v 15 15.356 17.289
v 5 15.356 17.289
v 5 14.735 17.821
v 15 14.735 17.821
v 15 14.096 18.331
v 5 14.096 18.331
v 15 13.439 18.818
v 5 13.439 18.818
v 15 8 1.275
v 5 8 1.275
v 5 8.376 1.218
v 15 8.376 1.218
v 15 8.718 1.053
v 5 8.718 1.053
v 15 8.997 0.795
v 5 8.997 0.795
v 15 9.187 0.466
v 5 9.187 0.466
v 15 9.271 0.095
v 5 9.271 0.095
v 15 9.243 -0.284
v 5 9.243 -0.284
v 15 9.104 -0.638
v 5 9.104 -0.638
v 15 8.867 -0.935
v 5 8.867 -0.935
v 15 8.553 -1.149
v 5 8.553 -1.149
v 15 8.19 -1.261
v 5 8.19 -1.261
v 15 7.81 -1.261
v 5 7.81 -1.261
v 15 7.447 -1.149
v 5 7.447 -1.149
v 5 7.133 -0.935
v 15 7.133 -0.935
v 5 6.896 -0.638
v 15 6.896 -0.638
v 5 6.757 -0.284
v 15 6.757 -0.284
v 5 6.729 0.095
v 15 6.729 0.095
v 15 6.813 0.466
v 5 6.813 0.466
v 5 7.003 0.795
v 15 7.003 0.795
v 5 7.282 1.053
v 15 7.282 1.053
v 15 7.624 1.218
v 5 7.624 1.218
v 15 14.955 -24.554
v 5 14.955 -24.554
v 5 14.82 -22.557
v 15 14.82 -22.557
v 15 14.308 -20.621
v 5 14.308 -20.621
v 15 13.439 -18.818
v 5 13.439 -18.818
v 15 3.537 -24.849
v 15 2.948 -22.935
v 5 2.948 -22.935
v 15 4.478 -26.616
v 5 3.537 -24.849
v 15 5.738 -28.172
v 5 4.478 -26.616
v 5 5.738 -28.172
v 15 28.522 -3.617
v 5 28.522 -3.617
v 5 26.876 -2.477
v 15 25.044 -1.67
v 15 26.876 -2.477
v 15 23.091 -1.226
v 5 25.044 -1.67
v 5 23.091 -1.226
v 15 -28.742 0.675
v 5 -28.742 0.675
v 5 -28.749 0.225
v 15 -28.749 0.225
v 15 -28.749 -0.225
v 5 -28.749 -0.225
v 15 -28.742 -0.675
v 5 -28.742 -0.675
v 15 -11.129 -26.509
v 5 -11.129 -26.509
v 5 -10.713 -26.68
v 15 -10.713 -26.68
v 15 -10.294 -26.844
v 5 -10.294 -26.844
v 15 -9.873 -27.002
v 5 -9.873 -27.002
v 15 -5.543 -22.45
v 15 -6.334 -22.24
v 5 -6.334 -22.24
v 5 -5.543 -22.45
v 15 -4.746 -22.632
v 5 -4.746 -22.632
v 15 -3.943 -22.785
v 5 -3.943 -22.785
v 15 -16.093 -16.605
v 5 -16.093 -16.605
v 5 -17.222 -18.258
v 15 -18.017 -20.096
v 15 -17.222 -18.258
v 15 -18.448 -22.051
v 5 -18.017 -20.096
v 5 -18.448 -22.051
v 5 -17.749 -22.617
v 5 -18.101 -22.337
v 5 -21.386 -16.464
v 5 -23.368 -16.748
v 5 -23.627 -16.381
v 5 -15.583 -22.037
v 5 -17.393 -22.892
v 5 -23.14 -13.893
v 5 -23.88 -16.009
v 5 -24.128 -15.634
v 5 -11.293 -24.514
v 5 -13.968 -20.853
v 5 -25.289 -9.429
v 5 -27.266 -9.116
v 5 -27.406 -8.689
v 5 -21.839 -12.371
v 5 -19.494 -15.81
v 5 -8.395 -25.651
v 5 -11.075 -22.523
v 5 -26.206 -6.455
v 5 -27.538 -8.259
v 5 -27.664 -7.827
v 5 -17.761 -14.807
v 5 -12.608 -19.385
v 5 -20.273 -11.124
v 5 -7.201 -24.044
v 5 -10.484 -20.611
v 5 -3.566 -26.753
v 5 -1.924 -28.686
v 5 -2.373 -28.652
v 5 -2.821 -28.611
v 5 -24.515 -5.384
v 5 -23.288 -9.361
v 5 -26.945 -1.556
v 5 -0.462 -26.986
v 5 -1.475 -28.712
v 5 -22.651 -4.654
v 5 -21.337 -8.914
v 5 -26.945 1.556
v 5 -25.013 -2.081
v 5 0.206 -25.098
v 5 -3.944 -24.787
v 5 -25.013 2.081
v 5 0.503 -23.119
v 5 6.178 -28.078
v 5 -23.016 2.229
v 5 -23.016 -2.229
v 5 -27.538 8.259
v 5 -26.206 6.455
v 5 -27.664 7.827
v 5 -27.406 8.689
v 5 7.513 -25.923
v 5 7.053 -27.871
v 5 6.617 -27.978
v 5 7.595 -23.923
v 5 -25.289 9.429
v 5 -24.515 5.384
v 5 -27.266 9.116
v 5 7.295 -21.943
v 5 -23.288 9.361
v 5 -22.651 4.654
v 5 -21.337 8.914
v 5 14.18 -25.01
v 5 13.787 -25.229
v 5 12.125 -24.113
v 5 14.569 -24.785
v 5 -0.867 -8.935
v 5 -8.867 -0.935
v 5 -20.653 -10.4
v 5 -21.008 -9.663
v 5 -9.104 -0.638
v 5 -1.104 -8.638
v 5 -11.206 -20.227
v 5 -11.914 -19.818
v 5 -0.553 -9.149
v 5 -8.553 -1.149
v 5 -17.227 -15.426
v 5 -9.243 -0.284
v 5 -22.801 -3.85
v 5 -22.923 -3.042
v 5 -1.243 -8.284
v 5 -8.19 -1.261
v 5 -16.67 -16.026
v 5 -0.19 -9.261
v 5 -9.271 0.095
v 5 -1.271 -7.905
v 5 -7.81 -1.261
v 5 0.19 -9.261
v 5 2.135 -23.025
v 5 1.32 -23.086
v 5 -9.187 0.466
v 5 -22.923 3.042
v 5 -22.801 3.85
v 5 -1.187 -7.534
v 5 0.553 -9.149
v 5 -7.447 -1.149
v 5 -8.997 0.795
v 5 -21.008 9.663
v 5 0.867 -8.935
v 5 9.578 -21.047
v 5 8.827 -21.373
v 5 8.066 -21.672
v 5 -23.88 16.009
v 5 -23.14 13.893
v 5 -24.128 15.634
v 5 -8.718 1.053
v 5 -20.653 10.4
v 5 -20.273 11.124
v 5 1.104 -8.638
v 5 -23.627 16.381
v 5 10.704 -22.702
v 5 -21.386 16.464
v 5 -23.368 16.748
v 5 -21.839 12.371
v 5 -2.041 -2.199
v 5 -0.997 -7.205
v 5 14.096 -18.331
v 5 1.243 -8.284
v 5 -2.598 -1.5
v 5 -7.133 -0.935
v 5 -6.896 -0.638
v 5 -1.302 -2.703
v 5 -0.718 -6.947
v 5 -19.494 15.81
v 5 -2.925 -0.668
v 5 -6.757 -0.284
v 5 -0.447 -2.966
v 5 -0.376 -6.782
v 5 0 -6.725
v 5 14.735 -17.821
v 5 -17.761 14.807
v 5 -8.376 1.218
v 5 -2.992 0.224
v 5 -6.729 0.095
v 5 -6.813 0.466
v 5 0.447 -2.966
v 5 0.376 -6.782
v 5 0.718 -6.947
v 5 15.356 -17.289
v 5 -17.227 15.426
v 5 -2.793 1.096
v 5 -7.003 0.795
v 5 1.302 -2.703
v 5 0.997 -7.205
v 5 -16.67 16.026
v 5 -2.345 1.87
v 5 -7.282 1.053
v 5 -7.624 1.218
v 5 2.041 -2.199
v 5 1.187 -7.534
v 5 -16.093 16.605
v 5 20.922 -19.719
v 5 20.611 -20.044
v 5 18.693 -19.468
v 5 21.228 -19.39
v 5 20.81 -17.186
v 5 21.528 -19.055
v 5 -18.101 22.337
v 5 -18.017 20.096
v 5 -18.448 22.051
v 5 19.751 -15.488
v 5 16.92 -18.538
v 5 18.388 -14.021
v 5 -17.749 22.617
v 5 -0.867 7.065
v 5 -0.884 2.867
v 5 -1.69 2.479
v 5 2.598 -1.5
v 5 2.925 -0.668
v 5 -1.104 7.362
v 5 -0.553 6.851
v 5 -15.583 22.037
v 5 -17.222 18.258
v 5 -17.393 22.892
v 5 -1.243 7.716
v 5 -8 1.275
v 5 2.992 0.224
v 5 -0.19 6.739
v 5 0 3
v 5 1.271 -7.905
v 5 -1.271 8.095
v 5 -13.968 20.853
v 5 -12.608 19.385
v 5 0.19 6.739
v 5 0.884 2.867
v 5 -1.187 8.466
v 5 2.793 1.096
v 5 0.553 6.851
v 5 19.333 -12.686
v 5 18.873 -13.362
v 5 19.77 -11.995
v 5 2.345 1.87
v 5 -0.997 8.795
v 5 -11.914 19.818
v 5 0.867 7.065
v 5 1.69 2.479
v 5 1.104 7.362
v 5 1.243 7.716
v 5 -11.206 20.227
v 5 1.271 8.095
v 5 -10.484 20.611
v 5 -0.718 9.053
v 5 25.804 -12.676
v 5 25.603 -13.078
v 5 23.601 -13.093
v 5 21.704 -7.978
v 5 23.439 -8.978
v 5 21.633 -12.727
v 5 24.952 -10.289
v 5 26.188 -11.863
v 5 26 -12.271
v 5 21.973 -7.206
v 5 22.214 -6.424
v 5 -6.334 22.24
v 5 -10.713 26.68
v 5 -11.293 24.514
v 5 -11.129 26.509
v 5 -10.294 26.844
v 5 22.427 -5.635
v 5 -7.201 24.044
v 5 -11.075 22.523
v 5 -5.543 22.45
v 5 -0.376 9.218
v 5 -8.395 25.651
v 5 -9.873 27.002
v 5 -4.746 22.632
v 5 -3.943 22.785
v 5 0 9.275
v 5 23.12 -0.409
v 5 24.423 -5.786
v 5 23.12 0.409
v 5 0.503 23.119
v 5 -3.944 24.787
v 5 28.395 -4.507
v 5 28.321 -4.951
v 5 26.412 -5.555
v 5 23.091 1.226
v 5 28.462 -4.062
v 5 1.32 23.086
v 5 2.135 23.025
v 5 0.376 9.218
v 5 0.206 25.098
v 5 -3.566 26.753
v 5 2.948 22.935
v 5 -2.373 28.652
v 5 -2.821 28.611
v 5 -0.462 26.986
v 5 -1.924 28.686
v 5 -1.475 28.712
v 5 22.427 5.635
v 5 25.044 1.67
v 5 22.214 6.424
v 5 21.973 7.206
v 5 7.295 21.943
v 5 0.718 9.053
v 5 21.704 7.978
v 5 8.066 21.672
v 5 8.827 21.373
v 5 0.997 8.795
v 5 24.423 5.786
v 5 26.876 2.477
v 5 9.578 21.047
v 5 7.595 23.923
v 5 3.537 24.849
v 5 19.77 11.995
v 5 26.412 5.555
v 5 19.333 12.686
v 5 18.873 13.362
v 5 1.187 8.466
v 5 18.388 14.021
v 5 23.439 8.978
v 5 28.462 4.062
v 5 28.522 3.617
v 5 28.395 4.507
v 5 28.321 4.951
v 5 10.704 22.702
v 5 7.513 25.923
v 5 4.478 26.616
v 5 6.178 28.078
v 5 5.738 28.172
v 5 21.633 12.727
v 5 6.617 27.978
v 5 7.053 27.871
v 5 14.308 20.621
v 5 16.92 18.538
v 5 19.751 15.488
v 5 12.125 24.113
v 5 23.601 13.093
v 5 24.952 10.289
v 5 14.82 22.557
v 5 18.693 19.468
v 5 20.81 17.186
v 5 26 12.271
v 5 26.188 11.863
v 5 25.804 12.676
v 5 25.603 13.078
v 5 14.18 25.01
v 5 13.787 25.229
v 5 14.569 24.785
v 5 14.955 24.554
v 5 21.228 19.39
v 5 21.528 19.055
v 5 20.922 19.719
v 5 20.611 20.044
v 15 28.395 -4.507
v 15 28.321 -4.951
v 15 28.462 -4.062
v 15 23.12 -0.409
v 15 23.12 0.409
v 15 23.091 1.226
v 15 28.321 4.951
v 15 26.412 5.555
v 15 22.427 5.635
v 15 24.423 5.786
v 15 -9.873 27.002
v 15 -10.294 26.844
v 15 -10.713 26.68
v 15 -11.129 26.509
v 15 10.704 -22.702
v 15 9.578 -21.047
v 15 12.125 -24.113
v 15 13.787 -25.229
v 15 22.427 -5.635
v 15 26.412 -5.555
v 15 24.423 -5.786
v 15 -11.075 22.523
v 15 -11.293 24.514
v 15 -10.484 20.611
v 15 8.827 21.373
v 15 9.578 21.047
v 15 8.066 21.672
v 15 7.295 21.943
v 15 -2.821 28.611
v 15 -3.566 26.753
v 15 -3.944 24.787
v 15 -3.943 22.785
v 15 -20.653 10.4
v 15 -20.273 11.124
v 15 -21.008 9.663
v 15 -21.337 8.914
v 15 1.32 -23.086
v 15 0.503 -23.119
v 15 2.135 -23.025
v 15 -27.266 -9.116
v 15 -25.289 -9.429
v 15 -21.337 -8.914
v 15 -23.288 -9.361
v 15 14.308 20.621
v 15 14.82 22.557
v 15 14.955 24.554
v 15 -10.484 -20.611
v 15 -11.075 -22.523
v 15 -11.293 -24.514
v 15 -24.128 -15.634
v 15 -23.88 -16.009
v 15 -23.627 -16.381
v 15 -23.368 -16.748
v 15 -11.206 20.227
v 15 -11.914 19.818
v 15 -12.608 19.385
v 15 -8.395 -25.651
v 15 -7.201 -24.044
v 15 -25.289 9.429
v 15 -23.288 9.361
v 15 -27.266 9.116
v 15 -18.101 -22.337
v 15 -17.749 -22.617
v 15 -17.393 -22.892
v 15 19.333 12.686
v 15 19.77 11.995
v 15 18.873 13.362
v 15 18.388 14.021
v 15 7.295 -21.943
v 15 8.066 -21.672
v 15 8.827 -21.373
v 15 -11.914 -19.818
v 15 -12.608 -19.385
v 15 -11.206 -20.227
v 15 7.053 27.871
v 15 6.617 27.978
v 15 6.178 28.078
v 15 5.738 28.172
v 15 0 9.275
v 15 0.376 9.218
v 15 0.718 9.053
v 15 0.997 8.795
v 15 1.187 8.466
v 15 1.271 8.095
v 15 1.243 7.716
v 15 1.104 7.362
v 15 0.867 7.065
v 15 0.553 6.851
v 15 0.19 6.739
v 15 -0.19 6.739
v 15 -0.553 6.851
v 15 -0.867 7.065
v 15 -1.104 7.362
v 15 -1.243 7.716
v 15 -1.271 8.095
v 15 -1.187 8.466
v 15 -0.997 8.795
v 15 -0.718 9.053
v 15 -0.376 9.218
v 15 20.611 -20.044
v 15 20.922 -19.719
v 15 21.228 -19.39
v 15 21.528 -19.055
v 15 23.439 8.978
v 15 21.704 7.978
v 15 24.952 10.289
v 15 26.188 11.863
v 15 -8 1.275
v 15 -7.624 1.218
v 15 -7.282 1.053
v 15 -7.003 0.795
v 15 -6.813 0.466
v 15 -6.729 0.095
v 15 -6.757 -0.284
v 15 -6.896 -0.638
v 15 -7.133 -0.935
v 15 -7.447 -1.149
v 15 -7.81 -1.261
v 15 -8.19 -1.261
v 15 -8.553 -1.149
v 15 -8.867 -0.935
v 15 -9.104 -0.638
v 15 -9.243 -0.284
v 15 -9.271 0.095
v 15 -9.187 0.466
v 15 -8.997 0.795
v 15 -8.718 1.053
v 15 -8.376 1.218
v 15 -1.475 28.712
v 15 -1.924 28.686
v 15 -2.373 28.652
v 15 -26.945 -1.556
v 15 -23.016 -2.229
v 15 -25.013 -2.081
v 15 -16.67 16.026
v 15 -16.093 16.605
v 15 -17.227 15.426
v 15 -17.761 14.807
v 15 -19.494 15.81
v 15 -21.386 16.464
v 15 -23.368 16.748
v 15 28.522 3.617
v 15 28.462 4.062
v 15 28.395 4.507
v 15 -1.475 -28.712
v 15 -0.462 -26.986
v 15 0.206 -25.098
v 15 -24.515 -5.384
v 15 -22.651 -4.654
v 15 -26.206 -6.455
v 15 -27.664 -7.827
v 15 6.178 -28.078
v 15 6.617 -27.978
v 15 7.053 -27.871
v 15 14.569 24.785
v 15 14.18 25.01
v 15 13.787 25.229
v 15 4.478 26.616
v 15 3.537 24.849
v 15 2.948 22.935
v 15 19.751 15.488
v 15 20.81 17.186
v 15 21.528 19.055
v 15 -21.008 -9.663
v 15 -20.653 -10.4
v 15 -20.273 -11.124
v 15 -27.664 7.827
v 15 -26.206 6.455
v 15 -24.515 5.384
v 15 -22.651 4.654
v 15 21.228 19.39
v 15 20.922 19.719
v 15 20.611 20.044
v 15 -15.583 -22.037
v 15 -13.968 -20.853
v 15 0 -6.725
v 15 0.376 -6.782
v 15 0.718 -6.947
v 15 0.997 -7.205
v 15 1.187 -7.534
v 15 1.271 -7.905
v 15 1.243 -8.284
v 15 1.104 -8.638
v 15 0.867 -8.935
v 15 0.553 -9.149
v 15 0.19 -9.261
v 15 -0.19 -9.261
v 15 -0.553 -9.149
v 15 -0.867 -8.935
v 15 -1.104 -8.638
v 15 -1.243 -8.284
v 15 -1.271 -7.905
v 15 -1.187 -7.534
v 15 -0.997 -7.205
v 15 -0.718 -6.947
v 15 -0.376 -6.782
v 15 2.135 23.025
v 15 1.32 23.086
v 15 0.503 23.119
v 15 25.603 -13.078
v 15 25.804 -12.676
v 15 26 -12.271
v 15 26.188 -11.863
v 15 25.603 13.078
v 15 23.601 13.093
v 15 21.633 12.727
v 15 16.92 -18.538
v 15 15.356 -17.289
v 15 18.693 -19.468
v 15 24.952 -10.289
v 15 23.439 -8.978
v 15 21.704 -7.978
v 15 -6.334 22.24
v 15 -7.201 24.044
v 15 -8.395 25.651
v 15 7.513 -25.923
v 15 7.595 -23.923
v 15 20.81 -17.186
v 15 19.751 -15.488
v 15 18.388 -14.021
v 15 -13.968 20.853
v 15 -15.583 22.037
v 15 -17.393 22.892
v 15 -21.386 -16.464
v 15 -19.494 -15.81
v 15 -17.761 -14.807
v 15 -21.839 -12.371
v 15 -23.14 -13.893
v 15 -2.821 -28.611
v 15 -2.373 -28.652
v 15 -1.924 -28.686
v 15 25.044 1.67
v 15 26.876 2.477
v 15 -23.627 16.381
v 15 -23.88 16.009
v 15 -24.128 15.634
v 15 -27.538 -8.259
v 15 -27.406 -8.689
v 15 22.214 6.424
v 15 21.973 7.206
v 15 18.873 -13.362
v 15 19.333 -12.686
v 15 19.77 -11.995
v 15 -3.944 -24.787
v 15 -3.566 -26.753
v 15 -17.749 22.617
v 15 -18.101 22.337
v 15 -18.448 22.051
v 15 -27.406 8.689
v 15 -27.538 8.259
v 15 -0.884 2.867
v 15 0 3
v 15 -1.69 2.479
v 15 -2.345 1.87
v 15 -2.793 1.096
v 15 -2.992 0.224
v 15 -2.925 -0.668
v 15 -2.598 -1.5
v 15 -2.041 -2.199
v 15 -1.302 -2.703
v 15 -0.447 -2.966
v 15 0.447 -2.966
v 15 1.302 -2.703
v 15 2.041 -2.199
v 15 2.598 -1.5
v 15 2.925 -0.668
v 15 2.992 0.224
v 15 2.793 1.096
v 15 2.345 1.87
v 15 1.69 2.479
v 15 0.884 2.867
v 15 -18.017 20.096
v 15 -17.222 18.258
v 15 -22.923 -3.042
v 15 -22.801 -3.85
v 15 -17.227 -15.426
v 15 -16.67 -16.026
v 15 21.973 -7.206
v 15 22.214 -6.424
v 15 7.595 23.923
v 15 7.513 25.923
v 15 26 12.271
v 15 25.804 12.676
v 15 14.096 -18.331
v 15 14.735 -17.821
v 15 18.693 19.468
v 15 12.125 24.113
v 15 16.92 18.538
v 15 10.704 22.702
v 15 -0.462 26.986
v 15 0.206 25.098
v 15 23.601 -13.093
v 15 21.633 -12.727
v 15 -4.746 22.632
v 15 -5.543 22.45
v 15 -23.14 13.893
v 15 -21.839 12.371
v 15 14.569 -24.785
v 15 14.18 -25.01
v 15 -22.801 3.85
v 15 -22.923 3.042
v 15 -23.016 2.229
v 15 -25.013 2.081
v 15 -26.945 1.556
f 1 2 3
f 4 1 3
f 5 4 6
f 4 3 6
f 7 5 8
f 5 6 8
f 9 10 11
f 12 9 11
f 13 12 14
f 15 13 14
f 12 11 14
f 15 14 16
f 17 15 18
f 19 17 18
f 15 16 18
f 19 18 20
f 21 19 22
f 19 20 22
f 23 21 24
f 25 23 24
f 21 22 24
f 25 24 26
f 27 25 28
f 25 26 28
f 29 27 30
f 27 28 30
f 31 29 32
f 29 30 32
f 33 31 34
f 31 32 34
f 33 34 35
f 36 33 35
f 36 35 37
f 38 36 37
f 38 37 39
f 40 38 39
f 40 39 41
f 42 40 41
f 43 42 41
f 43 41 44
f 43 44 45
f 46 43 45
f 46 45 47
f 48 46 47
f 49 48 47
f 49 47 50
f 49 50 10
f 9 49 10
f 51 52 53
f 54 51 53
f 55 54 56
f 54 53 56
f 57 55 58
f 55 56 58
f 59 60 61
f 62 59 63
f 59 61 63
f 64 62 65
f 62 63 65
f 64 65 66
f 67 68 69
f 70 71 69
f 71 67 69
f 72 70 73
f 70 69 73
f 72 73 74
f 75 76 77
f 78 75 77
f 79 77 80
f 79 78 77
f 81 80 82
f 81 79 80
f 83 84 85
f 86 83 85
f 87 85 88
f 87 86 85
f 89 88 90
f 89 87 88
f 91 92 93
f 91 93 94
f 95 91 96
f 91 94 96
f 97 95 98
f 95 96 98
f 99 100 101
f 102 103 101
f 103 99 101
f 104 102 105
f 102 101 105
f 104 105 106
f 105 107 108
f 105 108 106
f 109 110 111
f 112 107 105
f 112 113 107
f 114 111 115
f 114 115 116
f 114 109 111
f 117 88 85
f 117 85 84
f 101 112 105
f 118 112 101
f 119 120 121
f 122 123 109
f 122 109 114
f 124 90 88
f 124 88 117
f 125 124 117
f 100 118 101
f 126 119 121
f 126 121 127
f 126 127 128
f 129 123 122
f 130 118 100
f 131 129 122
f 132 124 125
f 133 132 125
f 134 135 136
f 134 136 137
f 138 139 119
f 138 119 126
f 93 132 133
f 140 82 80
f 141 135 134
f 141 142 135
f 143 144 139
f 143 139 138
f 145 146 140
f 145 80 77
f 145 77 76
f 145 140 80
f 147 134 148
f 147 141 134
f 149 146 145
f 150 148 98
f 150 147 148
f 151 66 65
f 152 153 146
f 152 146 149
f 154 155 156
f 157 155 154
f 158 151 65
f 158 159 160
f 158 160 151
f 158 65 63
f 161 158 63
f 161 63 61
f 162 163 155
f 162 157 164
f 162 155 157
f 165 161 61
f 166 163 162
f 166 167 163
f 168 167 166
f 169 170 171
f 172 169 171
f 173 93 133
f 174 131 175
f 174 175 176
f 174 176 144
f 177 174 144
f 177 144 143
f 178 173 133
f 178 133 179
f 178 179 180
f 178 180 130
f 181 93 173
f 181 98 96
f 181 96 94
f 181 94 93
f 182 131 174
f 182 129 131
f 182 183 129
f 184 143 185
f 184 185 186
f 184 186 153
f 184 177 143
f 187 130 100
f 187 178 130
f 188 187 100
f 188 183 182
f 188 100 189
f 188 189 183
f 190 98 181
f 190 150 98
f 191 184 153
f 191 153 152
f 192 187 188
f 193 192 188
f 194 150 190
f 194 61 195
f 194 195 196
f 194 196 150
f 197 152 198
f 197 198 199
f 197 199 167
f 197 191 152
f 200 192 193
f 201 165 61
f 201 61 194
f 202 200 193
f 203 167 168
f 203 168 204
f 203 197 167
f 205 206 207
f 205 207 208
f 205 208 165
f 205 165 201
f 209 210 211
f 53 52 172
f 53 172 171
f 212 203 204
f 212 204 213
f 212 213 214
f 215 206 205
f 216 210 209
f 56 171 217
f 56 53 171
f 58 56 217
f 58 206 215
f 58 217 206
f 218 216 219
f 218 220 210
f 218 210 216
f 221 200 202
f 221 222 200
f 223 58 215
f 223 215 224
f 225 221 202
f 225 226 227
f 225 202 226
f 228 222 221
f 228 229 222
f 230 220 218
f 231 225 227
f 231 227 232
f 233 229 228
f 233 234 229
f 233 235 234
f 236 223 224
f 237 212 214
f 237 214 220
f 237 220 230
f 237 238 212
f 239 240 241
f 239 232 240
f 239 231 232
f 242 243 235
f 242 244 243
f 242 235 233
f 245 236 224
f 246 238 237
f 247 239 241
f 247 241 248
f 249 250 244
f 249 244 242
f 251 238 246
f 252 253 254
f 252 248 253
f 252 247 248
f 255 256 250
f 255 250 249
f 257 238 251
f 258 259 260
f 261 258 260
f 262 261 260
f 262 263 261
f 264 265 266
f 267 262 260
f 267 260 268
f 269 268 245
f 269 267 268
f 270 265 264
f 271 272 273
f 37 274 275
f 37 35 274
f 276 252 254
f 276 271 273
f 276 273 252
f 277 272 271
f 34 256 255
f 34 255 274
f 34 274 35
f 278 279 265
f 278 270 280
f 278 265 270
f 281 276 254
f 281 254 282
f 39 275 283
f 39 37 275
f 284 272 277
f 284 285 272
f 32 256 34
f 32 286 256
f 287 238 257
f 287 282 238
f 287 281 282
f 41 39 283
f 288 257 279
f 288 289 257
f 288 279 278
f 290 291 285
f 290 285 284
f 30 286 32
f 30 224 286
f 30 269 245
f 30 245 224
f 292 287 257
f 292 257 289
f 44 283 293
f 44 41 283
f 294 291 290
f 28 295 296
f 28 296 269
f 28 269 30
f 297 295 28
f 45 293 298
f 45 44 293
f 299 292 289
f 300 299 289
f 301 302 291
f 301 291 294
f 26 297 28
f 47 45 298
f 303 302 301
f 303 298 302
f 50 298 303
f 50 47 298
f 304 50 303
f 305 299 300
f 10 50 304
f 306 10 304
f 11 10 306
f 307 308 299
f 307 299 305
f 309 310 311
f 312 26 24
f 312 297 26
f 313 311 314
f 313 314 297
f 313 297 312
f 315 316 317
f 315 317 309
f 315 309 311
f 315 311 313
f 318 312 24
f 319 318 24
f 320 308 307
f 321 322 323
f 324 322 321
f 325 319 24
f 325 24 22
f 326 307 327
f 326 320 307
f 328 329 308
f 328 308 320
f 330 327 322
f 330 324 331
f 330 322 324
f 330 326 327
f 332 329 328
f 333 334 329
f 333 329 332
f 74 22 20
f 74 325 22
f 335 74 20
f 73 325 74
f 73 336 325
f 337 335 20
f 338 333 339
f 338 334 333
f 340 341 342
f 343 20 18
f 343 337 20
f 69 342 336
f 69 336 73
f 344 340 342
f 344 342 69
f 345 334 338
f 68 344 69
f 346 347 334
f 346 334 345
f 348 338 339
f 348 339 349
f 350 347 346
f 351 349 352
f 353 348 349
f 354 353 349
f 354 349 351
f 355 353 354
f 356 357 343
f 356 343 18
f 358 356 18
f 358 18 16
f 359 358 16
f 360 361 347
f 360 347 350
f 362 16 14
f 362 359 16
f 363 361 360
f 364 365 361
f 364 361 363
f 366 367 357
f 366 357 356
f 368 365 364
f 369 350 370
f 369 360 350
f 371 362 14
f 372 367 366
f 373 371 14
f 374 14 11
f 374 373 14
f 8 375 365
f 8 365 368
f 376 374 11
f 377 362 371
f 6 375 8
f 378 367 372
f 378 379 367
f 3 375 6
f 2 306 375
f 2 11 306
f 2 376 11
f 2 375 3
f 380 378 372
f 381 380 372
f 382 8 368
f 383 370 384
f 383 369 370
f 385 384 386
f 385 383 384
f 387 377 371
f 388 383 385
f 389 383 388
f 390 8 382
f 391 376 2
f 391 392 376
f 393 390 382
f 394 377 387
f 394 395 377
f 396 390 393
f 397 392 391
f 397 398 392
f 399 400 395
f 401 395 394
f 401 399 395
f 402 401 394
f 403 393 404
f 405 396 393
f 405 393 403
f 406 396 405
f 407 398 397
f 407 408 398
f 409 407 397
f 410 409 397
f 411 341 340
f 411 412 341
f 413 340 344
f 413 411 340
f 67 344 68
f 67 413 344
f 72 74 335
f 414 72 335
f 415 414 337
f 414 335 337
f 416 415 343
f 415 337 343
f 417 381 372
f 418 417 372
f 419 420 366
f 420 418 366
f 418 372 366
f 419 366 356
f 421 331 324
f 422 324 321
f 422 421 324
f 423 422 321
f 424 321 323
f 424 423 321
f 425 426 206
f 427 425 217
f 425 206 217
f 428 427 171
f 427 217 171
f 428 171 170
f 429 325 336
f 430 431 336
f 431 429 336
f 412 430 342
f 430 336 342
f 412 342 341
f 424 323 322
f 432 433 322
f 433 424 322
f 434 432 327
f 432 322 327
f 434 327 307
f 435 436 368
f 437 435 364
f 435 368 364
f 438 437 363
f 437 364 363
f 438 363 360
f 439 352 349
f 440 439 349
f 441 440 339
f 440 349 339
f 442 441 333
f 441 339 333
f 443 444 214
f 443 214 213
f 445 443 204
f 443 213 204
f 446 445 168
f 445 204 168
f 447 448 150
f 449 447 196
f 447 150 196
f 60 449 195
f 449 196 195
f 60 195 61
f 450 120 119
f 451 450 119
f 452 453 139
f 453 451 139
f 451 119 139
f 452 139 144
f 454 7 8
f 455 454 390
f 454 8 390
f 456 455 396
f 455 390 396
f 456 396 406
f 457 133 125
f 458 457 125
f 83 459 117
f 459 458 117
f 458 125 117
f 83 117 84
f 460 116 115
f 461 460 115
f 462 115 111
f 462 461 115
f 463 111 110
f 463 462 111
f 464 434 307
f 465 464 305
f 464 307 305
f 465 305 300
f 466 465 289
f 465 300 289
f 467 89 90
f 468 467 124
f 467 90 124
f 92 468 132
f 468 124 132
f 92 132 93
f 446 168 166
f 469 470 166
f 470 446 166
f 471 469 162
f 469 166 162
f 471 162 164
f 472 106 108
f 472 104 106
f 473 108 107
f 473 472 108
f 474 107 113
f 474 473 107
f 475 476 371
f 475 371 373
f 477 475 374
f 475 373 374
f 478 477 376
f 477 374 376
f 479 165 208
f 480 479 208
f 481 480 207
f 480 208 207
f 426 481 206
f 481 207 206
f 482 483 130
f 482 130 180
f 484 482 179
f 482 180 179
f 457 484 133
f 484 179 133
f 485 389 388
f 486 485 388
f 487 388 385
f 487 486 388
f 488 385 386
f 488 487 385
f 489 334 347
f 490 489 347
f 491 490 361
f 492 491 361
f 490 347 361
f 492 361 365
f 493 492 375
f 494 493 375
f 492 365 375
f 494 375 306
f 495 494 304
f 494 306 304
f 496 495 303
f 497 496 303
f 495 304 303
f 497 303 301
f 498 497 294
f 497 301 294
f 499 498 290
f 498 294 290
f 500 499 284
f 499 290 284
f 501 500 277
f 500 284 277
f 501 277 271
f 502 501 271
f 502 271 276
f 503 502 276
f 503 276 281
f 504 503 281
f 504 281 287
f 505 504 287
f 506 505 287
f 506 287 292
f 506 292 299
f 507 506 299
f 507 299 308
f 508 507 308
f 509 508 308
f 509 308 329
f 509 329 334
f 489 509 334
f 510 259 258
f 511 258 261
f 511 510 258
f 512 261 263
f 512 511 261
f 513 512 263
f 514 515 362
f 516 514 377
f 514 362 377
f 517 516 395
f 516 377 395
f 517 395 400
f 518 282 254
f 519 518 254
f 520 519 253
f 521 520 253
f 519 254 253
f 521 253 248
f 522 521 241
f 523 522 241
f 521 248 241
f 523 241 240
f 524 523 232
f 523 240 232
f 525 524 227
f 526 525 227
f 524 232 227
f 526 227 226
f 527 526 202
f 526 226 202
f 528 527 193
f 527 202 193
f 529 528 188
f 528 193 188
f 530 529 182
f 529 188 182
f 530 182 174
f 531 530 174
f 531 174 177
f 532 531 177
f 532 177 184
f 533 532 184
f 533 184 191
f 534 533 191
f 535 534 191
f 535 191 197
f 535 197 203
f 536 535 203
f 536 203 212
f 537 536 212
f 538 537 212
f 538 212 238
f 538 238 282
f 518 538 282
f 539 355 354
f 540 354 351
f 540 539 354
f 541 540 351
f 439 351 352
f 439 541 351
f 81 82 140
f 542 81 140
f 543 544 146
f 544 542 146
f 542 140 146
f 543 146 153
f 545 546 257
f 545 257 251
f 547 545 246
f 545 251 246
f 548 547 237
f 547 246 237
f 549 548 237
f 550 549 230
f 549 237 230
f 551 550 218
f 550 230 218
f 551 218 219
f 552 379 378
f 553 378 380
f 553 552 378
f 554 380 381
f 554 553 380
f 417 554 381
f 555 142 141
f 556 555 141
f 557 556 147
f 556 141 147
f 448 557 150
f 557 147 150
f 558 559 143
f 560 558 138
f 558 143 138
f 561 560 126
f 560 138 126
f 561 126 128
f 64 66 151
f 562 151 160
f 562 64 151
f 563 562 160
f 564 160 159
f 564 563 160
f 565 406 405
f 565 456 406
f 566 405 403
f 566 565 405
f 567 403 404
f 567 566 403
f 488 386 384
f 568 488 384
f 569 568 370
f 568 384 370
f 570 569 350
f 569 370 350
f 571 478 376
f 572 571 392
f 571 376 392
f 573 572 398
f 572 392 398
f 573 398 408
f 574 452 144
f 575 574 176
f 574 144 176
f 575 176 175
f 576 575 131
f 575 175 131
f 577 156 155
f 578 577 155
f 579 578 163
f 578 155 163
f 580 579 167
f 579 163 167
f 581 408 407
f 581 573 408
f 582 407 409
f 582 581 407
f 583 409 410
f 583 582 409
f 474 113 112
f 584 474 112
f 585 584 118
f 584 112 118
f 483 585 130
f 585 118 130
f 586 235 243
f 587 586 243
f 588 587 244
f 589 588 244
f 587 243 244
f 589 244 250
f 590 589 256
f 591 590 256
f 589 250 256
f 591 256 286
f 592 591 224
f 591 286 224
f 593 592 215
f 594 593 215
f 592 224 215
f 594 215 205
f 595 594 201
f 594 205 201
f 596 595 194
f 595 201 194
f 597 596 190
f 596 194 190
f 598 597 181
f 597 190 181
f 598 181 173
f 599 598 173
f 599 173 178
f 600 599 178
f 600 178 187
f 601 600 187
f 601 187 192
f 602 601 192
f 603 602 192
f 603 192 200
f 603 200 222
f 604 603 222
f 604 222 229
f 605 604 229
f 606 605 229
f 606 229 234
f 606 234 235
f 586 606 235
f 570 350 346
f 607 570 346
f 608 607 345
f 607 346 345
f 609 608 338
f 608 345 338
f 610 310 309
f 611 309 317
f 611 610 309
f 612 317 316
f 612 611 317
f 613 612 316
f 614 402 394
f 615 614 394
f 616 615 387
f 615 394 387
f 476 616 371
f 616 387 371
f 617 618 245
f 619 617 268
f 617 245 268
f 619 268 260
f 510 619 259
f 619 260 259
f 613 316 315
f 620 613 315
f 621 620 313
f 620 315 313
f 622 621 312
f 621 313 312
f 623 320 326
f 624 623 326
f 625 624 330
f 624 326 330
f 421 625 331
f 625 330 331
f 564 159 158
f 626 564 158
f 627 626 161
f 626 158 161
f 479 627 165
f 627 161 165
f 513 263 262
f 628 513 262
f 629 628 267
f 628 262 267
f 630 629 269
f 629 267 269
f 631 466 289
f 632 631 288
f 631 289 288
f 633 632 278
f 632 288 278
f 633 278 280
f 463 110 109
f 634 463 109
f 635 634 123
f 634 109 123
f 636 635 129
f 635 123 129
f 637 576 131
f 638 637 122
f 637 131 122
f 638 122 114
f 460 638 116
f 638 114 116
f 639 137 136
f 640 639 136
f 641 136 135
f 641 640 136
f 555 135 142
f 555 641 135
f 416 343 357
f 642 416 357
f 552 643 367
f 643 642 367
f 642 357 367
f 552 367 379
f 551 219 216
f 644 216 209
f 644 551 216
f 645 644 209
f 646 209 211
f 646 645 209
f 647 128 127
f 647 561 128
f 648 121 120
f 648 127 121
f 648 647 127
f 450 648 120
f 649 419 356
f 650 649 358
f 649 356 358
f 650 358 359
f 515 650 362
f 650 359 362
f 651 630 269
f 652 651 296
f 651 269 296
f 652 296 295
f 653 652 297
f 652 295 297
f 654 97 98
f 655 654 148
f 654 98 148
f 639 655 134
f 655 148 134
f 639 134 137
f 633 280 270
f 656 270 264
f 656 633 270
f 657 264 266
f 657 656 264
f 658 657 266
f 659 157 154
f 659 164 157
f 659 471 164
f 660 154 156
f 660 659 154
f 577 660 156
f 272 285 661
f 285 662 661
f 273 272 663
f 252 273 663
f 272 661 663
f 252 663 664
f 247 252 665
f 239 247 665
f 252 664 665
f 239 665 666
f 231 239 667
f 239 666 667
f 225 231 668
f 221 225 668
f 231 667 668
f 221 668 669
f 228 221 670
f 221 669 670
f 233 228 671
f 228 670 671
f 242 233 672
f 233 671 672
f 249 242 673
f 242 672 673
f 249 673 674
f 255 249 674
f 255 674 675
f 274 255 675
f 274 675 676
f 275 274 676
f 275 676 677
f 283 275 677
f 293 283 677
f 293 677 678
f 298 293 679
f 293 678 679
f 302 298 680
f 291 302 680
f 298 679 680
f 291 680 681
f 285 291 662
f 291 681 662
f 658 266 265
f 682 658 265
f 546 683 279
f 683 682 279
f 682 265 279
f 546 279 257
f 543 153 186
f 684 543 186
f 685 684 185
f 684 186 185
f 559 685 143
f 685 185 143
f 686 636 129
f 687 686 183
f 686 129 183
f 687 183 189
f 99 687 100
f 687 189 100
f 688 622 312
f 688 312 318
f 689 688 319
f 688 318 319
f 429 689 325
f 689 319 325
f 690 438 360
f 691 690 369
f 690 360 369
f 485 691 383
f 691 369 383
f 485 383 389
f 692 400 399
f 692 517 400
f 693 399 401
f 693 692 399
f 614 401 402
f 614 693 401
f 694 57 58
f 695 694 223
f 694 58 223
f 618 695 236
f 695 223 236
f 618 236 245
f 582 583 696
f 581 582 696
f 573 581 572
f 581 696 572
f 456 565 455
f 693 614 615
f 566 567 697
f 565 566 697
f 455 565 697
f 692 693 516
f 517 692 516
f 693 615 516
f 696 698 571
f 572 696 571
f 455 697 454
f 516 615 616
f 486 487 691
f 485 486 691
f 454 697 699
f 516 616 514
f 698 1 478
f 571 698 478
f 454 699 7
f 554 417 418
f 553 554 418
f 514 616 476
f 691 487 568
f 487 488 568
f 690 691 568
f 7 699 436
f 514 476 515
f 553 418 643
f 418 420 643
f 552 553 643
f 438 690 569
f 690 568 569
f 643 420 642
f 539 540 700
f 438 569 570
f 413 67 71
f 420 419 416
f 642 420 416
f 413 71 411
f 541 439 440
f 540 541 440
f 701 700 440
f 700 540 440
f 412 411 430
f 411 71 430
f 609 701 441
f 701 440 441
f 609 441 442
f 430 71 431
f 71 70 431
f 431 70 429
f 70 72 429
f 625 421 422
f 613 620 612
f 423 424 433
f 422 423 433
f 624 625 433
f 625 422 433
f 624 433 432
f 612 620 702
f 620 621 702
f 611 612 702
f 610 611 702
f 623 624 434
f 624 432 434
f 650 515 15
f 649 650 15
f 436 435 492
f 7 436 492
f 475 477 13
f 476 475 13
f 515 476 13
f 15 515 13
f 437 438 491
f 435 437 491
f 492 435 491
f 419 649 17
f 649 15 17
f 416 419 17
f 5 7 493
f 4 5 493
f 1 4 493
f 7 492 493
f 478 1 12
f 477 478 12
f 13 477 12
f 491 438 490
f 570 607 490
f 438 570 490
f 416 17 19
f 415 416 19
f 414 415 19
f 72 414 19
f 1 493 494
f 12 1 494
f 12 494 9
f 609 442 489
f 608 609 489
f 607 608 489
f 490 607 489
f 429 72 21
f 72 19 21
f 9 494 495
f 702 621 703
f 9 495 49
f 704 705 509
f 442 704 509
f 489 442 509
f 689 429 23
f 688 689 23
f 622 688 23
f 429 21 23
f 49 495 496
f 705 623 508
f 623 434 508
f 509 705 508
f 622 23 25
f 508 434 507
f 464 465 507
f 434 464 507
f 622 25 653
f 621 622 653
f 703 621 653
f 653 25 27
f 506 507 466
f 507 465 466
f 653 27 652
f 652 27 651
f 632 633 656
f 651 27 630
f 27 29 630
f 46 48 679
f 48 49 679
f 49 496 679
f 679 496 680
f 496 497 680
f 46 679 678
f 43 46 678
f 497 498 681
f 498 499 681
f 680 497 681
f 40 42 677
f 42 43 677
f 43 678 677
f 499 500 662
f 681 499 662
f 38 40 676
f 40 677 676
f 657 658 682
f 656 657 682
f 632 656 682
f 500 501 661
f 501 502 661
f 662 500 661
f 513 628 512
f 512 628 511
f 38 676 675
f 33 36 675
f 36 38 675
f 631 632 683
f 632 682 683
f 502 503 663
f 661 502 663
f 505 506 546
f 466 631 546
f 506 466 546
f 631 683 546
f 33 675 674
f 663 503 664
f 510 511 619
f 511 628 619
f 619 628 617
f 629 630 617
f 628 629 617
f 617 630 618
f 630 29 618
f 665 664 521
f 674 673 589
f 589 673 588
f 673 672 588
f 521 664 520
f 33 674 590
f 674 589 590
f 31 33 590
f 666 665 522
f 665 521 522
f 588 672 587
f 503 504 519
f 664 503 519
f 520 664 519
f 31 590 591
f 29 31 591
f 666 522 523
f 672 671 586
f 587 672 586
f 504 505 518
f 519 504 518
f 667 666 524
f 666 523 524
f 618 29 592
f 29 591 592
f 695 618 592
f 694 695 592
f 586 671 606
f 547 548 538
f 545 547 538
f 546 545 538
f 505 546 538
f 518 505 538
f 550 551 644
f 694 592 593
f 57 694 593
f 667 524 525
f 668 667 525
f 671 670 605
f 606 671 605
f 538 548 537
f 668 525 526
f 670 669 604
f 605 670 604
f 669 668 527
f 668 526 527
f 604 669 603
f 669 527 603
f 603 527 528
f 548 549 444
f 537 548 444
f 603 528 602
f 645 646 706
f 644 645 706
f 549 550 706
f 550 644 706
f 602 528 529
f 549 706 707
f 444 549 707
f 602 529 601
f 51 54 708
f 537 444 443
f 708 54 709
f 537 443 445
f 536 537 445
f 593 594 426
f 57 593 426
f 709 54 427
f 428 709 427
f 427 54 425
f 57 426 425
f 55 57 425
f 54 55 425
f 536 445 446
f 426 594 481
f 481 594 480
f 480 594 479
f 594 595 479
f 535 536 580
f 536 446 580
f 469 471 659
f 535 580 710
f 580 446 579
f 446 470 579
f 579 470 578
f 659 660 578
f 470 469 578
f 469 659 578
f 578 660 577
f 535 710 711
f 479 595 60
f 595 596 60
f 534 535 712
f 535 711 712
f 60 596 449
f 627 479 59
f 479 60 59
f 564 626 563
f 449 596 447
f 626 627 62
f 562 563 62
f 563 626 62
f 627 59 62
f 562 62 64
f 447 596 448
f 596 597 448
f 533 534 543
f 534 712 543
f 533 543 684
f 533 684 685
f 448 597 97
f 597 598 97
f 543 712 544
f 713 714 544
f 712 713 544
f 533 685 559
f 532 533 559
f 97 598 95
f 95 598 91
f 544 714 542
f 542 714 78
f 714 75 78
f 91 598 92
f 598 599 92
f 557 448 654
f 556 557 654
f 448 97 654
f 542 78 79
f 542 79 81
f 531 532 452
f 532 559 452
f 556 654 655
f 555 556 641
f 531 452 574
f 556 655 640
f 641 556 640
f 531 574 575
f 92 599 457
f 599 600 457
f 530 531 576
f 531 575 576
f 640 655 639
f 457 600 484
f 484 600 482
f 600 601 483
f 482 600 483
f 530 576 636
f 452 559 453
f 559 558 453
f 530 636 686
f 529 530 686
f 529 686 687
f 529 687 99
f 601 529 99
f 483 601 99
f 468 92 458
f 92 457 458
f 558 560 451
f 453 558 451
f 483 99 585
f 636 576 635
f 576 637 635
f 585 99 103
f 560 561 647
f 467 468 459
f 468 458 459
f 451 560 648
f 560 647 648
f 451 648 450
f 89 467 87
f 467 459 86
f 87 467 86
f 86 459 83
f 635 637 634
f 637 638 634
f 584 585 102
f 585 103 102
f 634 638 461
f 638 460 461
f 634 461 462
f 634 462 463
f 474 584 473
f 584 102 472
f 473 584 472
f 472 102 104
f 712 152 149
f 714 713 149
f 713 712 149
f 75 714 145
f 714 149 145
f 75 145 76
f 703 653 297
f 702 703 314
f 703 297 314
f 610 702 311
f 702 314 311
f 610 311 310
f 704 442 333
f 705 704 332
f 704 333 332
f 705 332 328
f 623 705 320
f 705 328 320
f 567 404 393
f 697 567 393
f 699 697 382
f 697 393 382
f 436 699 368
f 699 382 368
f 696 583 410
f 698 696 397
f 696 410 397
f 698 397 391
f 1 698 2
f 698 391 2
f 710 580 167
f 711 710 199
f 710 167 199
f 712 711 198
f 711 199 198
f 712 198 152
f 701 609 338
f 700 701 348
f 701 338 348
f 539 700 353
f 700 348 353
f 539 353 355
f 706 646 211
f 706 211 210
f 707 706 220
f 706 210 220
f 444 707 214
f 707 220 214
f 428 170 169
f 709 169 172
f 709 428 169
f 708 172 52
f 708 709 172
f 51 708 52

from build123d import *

# Parameters (mm, degrees)
BASPROSKE_W              = 15
BASPROSKE_H              = 28.75
TOOTHCUT_DEPTH           = 44.337339558
TEETHCUTS_COUNT          = 21
TEETHCUTS_ANGLE          = 342.857142857
HUBNEAONESKE_R           = 12
HUBNEARONE_DEPTH         = 35.0000508
BORSKE_R                 = 3
BORE_DEPTH               = 15.0000508
CUT_EXTRUDE_1_DEPTH      = 54.627906094
CUT_EXTRUDE_1_DEPTH_BACK = 54.627906094
SKETCH_2_R               = 1.275
CUT_EXTRUDE_2_DEPTH      = 44.312224095
CUT_EXTRUDE_3_DEPTH      = 5


with BuildPart() as part:
    # BasProSke → Base-Revolve (revolve)
    with BuildSketch(Plane(origin=(0, 0, 0), x_dir=(1, 0, 0), z_dir=(0, 1, 0)), mode=Mode.PRIVATE) as base_revolve_sk:
        with Locations((7.5, 14.375)):
            Rectangle(BASPROSKE_W, BASPROSKE_H)
    revolve(base_revolve_sk.sketch.rotate(Axis((-10, 0, 0), (1, 0, 0)), 180), axis=Axis((-10, 0, 0), (1, 0, 0)))

    # TooCutSke → ToothCut (cut, through all)
    with BuildSketch(Plane(origin=(0, 0, 0), x_dir=(0, 0, -1), z_dir=(1, 0, 0))):
        with BuildLine():
            ThreePointArc((1.226021101, 23.091475662), (0, 23.124), (-1.226021101, 23.091475662))
            ThreePointArc((-1.226021101, 23.091475662), (-2.035978165, 25.992768242), (-3.636318743, 28.544716344))
            ThreePointArc((-3.636318743, 28.544716344), (0, 28.7754), (3.636318743, 28.544716344))
            ThreePointArc((3.636318743, 28.544716344), (2.035978165, 25.992768242), (1.226021101, 23.091475662))
        make_face()
    toothcut = extrude(amount=TOOTHCUT_DEPTH, mode=Mode.SUBTRACT)

    # TeethCuts: ToothCut ×21 about axis
    teethcuts_axis = Axis((-10, 0, 0), (1, 0, 0))
    for i in range(1, TEETHCUTS_COUNT):
        add(toothcut.rotate(teethcuts_axis, i * TEETHCUTS_ANGLE / (TEETHCUTS_COUNT - 1)), mode=Mode.SUBTRACT)

    # HubNeaOneSke → HubNearOne (add)
    with BuildSketch(Plane.ZY):
        with Locations(Location((0, 0, 0), (0, 0, 180))):
            Circle(HUBNEAONESKE_R)
    extrude(amount=HUBNEARONE_DEPTH)

    # BorSke → Bore (cut, symmetric)
    with BuildSketch(Plane(origin=(0, 0, 0), x_dir=(0, 0, -1), z_dir=(1, 0, 0))):
        with Locations(Location((0, 0, 0), (0, 0, 180))):
            Circle(BORSKE_R)
    extrude(amount=BORE_DEPTH, both=True, mode=Mode.SUBTRACT)

    # 草圖1 → 除料-伸長1 (cut, two sides: drawn at the far end of the back side and taken through both)
    with BuildSketch(Plane(origin=(0, 0, 0), x_dir=(1, 0, 0), z_dir=(0, 1, 0)).offset(-CUT_EXTRUDE_1_DEPTH_BACK)):
        Polygon((-35.0000508, -11.862952099), (-35.0000508, -15.448809423), (0, -15.448809423), (0, -11.862952099), (0, 12), (-35.0000508, 12), align=None)
    extrude(amount=CUT_EXTRUDE_1_DEPTH + CUT_EXTRUDE_1_DEPTH_BACK, mode=Mode.SUBTRACT)

    # 草圖2 → 除料-伸長2 (cut, through all)
    with BuildSketch(Plane.ZY):
        with Locations((0, 8)):
            Circle(SKETCH_2_R)
        with Locations((8, 0)):
            Circle(SKETCH_2_R)
        with Locations((0, -8)):
            Circle(SKETCH_2_R)
        with Locations((-8, 0)):
            Circle(SKETCH_2_R)
    extrude(amount=-CUT_EXTRUDE_2_DEPTH, mode=Mode.SUBTRACT)

    # 草圖3 → 除料-伸長3 (cut)
    with BuildSketch(Plane.ZY):
        with BuildLine():
            ThreePointArc((15.633632839, -24.127826762), (16.195451669, -23.754364762), (16.748353108, -23.367823351))
            ThreePointArc((16.748353108, -23.367823351), (16.182150595, -20.424548747), (14.807455158, -17.761155586))
            ThreePointArc((14.807455158, -17.761155586), (15.728314388, -16.951091484), (16.604929283, -16.093343329))
            ThreePointArc((16.604929283, -16.093343329), (19.158143938, -17.66323046), (22.050876182, -18.447800942))
            ThreePointArc((22.050876182, -18.447800942), (22.477655121, -17.925331803), (22.892057619, -17.392992783))
            ThreePointArc((22.892057619, -17.392992783), (21.483464476, -14.747370732), (19.384793984, -12.60750325))
            ThreePointArc((19.384793984, -12.60750325), (20.025971437, -11.562), (20.610815085, -10.483972412))
            ThreePointArc((20.610815085, -10.483972412), (23.513329931, -11.231540632), (26.508802408, -11.128607052))
            ThreePointArc((26.508802408, -11.128607052), (26.762620274, -10.503554451), (27.001702351, -9.872718478))
            ThreePointArc((27.001702351, -9.872718478), (24.87587826, -7.75982411), (22.239708796, -6.333618923))
            ThreePointArc((22.239708796, -6.333618923), (22.544233041, -5.145574077), (22.785339517, -3.943054539))
            ThreePointArc((22.785339517, -3.943054539), (25.779253374, -3.80187913), (28.611305207, -2.820587588))
            ThreePointArc((28.611305207, -2.820587588), (28.669609169, -2.148490191), (28.712127333, -1.475209811))
            ThreePointArc((28.712127333, -1.475209811), (26.057961094, -0.082783062), (23.118527885, 0.50303524))
            ThreePointArc((23.118527885, 0.50303524), (23.059340606, 1.728058684), (22.935286541, 2.948221034))
            ThreePointArc((22.935286541, 2.948221034), (25.754577023, 3.965596017), (28.17156798, 5.738053461))
            ThreePointArc((28.17156798, 5.738053461), (28.029177475, 6.397476851), (27.871353801, 7.053377721))
            ThreePointArc((27.871353801, 7.053377721), (24.924679732, 7.601613624), (21.943164316, 7.294992515))
            ThreePointArc((21.943164316, 7.294992515), (21.525524564, 8.448145847), (21.047332707, 9.57753423))
            ThreePointArc((21.047332707, 9.57753423), (23.441493482, 11.380710555), (25.22866331, 13.786843279))
            ThreePointArc((25.22866331, 13.786843279), (24.898230359, 14.375), (24.554088173, 14.95524169))
            ThreePointArc((24.554088173, 14.95524169), (21.576731195, 14.610573581), (18.818054303, 13.438757691))
            ThreePointArc((18.818054303, 13.438757691), (18.079071201, 14.417578178), (17.289230996, 15.35584148))
            ThreePointArc((17.289230996, 15.35584148), (19.045530374, 17.784599017), (20.04408119, 20.610611569))
            ThreePointArc((20.04408119, 20.610611569), (19.554966211, 21.075241315), (19.055084056, 21.528266805))
            ThreePointArc((19.055084056, 21.528266805), (16.311595404, 20.321319958), (14.020877582, 18.388430271))
            ThreePointArc((14.020877582, 18.388430271), (13.026213023, 19.105945417), (11.994905239, 19.769714826))
            ThreePointArc((11.994905239, 19.769714826), (12.957288312, 22.608247809), (13.078494494, 25.603036573))
            ThreePointArc((13.078494494, 25.603036573), (12.4741575, 25.902854952), (11.862952099, 26.188410939))
            ThreePointArc((11.862952099, 26.188410939), (9.597102778, 24.226427877), (7.977884359, 21.704210125))
            ThreePointArc((7.977884359, 21.704210125), (6.815918653, 22.096665561), (5.634779513, 22.426962252))
            ThreePointArc((5.634779513, 22.426962252), (5.717734322, 25.42305457), (4.950826169, 28.320519421))
            ThreePointArc((4.950826169, 28.320519421), (4.284965153, 28.428886254), (3.616744788, 28.521599835))
            ThreePointArc((3.616744788, 28.521599835), (2.029865455, 25.978911364), (1.226021101, 23.091475662))
            ThreePointArc((1.226021101, 23.091475662), (0, 23.124), (-1.226021101, 23.091475662))
            ThreePointArc((-1.226021101, 23.091475662), (-2.029865455, 25.978911364), (-3.616744788, 28.521599835))
            ThreePointArc((-3.616744788, 28.521599835), (-4.284965153, 28.428886254), (-4.950826169, 28.320519421))
            ThreePointArc((-4.950826169, 28.320519421), (-5.717734322, 25.42305457), (-5.634779513, 22.426962252))
            ThreePointArc((-5.634779513, 22.426962252), (-6.815918653, 22.096665561), (-7.977884359, 21.704210125))
            ThreePointArc((-7.977884359, 21.704210125), (-9.597102778, 24.226427877), (-11.862952099, 26.188410939))
            ThreePointArc((-11.862952099, 26.188410939), (-12.4741575, 25.902854952), (-13.078494494, 25.603036573))
            ThreePointArc((-13.078494494, 25.603036573), (-12.957288312, 22.608247809), (-11.994905239, 19.769714826))
            ThreePointArc((-11.994905239, 19.769714826), (-13.026213023, 19.105945417), (-14.020877582, 18.388430271))
            ThreePointArc((-14.020877582, 18.388430271), (-16.311595404, 20.321319958), (-19.055084056, 21.528266805))
            ThreePointArc((-19.055084056, 21.528266805), (-19.554966211, 21.075241315), (-20.04408119, 20.610611569))
            ThreePointArc((-20.04408119, 20.610611569), (-19.045530374, 17.784599017), (-17.289230996, 15.35584148))
            ThreePointArc((-17.289230996, 15.35584148), (-18.079071201, 14.417578178), (-18.818054303, 13.438757691))
            ThreePointArc((-18.818054303, 13.438757691), (-21.576731195, 14.610573581), (-24.554088173, 14.95524169))
            ThreePointArc((-24.554088173, 14.95524169), (-24.898230359, 14.375), (-25.22866331, 13.786843279))
            ThreePointArc((-25.22866331, 13.786843279), (-23.441493482, 11.380710555), (-21.047332707, 9.57753423))
            ThreePointArc((-21.047332707, 9.57753423), (-21.525524564, 8.448145847), (-21.943164316, 7.294992515))
            ThreePointArc((-21.943164316, 7.294992515), (-24.924679732, 7.601613624), (-27.871353801, 7.053377721))
            ThreePointArc((-27.871353801, 7.053377721), (-28.029177475, 6.397476851), (-28.17156798, 5.738053461))
            ThreePointArc((-28.17156798, 5.738053461), (-25.754577023, 3.965596017), (-22.935286541, 2.948221034))
            ThreePointArc((-22.935286541, 2.948221034), (-23.059340606, 1.728058684), (-23.118527885, 0.50303524))
            ThreePointArc((-23.118527885, 0.50303524), (-26.057961094, -0.082783062), (-28.712127333, -1.475209811))
            ThreePointArc((-28.712127333, -1.475209811), (-28.669609169, -2.148490191), (-28.611305207, -2.820587588))
            ThreePointArc((-28.611305207, -2.820587588), (-25.779253374, -3.80187913), (-22.785339517, -3.943054539))
            ThreePointArc((-22.785339517, -3.943054539), (-22.544233041, -5.145574077), (-22.239708796, -6.333618923))
            ThreePointArc((-22.239708796, -6.333618923), (-24.87587826, -7.75982411), (-27.001702351, -9.872718478))
            ThreePointArc((-27.001702351, -9.872718478), (-26.762620274, -10.503554451), (-26.508802408, -11.128607052))
            ThreePointArc((-26.508802408, -11.128607052), (-23.513329931, -11.231540632), (-20.610815085, -10.483972412))
            ThreePointArc((-20.610815085, -10.483972412), (-20.025971437, -11.562), (-19.384793984, -12.60750325))
            ThreePointArc((-19.384793984, -12.60750325), (-21.483464476, -14.747370732), (-22.892057619, -17.392992783))
            ThreePointArc((-22.892057619, -17.392992783), (-22.477655121, -17.925331803), (-22.050876182, -18.447800942))
            ThreePointArc((-22.050876182, -18.447800942), (-19.158143938, -17.66323046), (-16.604929283, -16.093343329))
            ThreePointArc((-16.604929283, -16.093343329), (-15.728314388, -16.951091484), (-14.807455158, -17.761155586))
            ThreePointArc((-14.807455158, -17.761155586), (-16.182150595, -20.424548747), (-16.748353108, -23.367823351))
            ThreePointArc((-16.748353108, -23.367823351), (-16.195451669, -23.754364762), (-15.633632839, -24.127826762))
            ThreePointArc((-15.633632839, -24.127826762), (-13.100672782, -22.525464747), (-11.123622645, -20.272750066))
            ThreePointArc((-11.123622645, -20.272750066), (-10.033127583, -20.834004101), (-8.914408959, -21.336651305))
            ThreePointArc((-8.914408959, -21.336651305), (-9.44298162, -24.286915974), (-9.116483925, -27.266320266))
            ThreePointArc((-9.116483925, -27.266320266), (-8.474211264, -27.472718166), (-7.827272612, -27.663989291))
            ThreePointArc((-7.827272612, -27.663989291), (-5.879149357, -25.386212641), (-4.65393332, -22.650833995))
            ThreePointArc((-4.65393332, -22.650833995), (-3.446453363, -22.865724026), (-2.229278404, -23.016291921))
            ThreePointArc((-2.229278404, -23.016291921), (-1.864762288, -25.991284136), (-0.674575137, -28.742084969))
            ThreePointArc((-0.674575137, -28.742084969), (0, -28.75), (0.674575137, -28.742084969))
            ThreePointArc((0.674575137, -28.742084969), (1.864762288, -25.991284136), (2.229278404, -23.016291921))
            ThreePointArc((2.229278404, -23.016291921), (3.446453363, -22.865724026), (4.65393332, -22.650833995))
            ThreePointArc((4.65393332, -22.650833995), (5.879149357, -25.386212641), (7.827272612, -27.663989291))
            ThreePointArc((7.827272612, -27.663989291), (8.474211264, -27.472718166), (9.116483925, -27.266320266))
            ThreePointArc((9.116483925, -27.266320266), (9.44298162, -24.286915974), (8.914408959, -21.336651305))
            ThreePointArc((8.914408959, -21.336651305), (10.033127583, -20.834004101), (11.123622645, -20.272750066))
            ThreePointArc((11.123622645, -20.272750066), (13.100672782, -22.525464747), (15.633632839, -24.127826762))
        make_face()
    extrude(amount=-CUT_EXTRUDE_3_DEPTH, mode=Mode.SUBTRACT)


solid = part.part
